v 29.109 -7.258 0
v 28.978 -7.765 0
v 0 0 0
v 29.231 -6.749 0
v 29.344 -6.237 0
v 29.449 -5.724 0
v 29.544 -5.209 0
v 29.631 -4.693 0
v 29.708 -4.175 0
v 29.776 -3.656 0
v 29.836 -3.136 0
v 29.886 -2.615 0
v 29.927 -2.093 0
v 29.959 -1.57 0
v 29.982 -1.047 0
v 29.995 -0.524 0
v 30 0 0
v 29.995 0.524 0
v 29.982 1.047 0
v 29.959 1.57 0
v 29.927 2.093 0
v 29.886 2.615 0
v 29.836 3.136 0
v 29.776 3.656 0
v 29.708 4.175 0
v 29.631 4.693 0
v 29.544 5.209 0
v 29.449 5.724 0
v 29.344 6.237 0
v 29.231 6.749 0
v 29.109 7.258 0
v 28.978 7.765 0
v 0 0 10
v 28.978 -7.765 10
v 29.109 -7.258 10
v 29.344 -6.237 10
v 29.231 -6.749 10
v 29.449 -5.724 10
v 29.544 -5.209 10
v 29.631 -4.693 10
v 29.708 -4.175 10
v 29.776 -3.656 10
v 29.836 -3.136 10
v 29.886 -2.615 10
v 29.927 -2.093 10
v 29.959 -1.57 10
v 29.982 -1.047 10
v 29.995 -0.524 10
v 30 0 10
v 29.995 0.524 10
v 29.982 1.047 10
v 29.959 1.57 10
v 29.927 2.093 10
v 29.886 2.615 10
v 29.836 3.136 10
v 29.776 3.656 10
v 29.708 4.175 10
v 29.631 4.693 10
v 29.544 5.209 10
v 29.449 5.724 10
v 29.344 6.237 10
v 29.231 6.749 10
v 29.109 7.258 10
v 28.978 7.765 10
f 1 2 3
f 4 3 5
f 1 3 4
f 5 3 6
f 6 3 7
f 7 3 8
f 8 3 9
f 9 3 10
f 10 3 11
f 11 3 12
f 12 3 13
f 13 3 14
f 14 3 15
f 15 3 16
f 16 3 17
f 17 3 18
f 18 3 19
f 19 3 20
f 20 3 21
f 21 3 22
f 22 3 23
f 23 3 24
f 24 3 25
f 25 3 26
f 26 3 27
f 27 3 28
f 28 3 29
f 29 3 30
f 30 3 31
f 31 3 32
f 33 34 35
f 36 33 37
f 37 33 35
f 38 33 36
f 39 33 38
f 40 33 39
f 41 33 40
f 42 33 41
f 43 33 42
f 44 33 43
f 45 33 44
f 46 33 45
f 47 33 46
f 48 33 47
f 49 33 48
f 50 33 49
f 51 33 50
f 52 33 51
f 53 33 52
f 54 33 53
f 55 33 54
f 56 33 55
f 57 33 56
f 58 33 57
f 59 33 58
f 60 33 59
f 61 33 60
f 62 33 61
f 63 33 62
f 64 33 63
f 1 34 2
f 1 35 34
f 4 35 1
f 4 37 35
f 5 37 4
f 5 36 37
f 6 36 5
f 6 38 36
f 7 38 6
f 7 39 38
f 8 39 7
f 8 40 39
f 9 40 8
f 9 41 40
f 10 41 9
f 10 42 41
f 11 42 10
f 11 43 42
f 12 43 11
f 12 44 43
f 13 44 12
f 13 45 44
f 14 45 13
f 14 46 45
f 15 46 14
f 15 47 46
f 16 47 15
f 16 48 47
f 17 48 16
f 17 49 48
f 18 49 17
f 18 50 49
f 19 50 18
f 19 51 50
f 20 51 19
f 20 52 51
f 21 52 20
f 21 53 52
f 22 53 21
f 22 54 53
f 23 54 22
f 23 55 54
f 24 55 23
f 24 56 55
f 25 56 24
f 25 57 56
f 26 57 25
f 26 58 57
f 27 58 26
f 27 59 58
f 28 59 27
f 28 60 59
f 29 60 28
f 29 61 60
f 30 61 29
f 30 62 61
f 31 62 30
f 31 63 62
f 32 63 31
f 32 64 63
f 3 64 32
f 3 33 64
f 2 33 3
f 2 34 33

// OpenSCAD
// Unit of length: Unit.MM
linear_extrude(height = 10.0, center = false, convexity = 1, twist = 0.0, scale = 1.0)
{
   intersection()
   {
      circle(d = 60.0, $fn = 360);
      polygon(points = [[0.0, 0.0], [30.01, -8.0412], [30.01, 8.0412]], convexity = 1);
   }
}
